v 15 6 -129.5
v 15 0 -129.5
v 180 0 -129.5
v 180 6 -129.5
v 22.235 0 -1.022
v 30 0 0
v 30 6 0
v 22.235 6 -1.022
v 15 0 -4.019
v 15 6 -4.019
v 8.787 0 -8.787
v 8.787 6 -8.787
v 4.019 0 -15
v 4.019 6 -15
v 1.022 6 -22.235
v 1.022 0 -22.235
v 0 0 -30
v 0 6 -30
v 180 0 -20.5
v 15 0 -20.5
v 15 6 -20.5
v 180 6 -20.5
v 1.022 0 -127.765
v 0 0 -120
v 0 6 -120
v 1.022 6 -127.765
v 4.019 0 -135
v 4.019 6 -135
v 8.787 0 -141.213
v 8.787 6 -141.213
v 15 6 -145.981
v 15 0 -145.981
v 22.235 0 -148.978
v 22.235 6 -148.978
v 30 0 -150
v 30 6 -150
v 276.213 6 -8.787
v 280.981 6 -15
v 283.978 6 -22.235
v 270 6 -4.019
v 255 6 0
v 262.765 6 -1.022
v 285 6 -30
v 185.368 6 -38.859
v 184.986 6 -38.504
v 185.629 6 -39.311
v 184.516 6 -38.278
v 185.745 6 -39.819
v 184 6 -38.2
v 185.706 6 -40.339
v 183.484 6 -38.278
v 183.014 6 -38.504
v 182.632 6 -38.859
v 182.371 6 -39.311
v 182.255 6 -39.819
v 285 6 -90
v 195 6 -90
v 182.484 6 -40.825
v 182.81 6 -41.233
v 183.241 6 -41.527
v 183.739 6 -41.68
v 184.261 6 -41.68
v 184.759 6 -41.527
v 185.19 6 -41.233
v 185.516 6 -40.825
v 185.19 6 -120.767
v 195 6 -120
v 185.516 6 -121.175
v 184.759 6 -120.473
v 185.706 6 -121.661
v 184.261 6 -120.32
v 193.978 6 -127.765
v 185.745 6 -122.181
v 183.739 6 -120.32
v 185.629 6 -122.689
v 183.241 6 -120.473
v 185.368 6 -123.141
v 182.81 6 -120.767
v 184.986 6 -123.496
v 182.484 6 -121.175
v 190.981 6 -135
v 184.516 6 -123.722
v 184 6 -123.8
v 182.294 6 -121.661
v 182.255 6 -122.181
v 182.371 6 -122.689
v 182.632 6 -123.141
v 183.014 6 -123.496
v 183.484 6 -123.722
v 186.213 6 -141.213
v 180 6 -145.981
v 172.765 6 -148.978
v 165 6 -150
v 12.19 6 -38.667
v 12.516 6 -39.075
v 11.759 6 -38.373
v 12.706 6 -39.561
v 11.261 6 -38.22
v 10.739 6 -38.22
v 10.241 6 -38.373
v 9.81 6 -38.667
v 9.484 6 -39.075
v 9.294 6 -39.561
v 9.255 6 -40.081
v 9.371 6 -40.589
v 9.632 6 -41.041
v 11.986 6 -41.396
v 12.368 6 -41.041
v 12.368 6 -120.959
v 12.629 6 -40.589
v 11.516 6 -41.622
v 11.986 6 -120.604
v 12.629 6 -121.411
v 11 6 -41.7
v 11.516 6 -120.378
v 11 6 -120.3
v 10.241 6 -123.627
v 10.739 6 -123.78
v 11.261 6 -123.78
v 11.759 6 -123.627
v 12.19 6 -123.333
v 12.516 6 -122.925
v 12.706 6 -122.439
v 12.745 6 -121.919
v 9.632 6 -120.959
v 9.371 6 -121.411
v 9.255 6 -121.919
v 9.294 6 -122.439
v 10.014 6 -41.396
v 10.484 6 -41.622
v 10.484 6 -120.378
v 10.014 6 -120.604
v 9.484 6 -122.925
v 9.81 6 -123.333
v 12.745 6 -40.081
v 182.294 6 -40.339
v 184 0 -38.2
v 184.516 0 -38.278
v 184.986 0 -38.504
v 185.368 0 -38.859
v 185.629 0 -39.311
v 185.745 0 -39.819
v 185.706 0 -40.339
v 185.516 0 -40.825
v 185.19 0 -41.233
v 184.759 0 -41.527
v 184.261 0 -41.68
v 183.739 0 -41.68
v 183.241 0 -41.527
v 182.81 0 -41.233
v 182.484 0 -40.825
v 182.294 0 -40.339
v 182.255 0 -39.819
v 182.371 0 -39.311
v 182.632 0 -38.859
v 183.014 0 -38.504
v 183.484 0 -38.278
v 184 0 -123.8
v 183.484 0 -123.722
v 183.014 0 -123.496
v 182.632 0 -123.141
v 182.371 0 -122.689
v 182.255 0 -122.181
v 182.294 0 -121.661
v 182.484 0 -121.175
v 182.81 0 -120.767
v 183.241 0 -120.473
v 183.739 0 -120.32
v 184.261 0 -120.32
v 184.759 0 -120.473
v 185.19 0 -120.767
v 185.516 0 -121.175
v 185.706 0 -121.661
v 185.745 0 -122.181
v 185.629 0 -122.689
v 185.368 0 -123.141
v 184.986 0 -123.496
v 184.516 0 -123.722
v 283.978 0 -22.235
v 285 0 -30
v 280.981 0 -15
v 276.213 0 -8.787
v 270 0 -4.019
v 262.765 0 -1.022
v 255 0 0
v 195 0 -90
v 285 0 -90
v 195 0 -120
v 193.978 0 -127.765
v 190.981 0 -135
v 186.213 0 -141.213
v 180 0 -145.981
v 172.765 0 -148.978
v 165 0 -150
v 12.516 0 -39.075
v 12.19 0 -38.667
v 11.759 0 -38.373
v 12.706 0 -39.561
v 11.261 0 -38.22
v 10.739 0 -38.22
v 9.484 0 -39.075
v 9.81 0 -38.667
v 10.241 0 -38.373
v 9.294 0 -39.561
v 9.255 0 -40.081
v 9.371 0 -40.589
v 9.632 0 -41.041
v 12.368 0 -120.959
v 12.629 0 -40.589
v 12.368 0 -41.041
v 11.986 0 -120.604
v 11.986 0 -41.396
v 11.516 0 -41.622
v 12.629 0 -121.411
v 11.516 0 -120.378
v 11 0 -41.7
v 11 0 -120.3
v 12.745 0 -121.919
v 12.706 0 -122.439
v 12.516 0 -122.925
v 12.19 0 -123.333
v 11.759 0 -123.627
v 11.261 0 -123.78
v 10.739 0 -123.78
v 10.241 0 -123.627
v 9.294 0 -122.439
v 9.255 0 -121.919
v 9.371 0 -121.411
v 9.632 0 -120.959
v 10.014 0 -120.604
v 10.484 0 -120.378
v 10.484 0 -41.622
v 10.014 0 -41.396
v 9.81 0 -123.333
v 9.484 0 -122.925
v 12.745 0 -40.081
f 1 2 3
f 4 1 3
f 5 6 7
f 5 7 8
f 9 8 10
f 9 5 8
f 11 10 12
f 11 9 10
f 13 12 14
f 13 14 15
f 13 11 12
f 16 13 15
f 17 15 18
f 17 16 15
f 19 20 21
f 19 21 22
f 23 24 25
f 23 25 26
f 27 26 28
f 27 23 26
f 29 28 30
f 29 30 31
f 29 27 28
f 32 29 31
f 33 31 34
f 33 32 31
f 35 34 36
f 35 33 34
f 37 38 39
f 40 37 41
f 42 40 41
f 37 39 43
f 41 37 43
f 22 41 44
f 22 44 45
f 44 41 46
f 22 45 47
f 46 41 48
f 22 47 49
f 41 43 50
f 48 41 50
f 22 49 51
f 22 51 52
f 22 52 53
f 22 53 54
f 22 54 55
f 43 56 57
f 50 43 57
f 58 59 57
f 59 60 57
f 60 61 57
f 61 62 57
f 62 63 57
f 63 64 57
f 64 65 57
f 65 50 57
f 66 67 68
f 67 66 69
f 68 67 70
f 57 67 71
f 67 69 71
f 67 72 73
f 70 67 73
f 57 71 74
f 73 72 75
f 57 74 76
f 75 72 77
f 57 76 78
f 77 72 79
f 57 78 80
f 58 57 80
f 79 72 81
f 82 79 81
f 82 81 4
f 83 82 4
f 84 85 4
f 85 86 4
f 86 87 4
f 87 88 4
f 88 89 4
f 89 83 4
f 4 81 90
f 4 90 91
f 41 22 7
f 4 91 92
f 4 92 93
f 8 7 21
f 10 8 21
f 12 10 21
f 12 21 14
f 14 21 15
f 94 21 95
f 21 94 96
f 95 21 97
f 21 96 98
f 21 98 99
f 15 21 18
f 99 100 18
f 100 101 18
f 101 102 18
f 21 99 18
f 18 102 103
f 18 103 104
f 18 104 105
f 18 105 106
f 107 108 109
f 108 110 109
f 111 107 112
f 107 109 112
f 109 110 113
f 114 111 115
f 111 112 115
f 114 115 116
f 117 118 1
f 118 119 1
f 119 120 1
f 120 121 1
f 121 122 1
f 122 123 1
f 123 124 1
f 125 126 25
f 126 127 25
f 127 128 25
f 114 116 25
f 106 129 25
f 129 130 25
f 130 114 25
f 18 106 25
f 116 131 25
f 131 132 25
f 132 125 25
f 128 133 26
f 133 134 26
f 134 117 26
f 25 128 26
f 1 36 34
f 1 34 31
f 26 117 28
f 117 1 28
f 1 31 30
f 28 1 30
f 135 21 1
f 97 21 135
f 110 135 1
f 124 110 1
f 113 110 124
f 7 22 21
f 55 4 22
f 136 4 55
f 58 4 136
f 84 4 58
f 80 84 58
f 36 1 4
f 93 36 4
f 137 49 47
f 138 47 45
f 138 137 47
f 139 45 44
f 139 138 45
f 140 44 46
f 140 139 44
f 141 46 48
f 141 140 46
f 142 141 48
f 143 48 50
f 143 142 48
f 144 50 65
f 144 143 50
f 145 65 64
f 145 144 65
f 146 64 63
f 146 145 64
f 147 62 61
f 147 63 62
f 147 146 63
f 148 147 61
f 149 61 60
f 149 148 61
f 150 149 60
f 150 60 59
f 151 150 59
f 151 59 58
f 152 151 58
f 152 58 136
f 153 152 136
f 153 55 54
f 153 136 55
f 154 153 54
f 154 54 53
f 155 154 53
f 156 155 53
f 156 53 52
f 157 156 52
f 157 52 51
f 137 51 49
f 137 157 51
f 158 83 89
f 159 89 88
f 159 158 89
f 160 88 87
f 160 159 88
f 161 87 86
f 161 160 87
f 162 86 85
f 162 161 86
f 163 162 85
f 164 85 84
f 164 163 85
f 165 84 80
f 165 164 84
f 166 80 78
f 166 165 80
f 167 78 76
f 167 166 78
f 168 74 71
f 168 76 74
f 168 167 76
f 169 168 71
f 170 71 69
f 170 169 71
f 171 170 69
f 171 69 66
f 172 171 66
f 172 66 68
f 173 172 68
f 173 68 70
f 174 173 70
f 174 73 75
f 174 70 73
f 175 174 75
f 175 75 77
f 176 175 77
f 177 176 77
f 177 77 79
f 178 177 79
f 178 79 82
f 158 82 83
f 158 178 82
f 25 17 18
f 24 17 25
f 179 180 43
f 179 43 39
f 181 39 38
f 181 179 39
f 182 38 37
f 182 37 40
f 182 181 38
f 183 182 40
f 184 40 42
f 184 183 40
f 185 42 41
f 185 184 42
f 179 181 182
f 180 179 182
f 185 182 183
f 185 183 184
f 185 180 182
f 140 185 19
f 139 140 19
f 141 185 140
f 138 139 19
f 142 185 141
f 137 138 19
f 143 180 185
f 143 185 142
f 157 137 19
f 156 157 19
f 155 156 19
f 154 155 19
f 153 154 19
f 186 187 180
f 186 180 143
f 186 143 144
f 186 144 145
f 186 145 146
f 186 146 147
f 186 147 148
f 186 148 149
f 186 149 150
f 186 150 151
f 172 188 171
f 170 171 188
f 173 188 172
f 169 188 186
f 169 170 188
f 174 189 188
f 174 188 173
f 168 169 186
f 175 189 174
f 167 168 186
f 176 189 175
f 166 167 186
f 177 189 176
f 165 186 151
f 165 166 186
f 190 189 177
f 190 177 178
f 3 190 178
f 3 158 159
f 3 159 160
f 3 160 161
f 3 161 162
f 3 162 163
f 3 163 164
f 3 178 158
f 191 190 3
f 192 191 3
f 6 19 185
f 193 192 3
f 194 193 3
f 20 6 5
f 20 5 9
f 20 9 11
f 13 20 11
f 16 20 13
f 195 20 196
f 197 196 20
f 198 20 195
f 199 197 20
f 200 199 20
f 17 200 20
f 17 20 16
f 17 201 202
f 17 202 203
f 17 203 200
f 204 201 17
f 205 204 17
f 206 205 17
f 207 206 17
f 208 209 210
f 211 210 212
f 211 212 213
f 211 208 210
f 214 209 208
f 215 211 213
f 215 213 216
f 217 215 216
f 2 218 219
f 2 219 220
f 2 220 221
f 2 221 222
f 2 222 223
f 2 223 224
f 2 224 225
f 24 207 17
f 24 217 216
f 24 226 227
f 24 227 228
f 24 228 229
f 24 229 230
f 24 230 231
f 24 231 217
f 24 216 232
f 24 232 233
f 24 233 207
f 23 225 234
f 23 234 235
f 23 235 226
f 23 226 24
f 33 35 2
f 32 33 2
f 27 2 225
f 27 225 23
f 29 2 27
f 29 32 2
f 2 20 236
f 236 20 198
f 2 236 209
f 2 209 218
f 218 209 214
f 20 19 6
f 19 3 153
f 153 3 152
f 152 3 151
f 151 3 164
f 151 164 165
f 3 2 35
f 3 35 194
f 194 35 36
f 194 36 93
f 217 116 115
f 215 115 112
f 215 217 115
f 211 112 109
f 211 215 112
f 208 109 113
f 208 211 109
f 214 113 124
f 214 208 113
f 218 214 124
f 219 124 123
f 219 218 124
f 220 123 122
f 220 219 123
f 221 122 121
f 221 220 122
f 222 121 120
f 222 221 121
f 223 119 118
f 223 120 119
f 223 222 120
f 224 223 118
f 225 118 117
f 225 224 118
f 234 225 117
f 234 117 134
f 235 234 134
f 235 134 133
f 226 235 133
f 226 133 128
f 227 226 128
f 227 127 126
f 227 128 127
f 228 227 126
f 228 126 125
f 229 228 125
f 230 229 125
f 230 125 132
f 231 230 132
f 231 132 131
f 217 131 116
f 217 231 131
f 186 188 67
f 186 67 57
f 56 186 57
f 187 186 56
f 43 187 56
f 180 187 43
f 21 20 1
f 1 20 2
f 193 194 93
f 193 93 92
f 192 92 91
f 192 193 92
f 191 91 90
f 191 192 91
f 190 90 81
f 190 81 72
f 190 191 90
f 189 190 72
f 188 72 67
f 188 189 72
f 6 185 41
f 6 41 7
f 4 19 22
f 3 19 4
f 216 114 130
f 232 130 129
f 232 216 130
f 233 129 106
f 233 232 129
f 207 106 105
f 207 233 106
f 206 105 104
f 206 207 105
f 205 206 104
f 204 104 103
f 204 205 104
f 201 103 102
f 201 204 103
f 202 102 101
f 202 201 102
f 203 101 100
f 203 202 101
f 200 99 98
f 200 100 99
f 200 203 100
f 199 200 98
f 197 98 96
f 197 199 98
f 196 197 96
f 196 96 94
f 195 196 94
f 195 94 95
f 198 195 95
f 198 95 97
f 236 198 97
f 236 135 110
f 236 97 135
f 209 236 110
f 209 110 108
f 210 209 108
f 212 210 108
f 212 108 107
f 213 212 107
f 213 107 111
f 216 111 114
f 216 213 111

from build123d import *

# Parameters (mm, degrees)
SKETCH1_W           = 165
SKETCH1_H           = 109
BOSS_EXTRUDE1_DEPTH = 6
SKETCH2_R           = 1.75
CUT_EXTRUDE4_DEPTH  = 323.119543027


with BuildPart() as part:
    # Sketch1 → Boss-Extrude1 (new body)
    with BuildSketch(Plane(origin=(0, 0, 0), x_dir=(1, 0, 0), z_dir=(0, 1, 0))):
        with BuildLine():
            Line((30, 150), (165, 150))
            ThreePointArc((165, 150), (186.213203436, 141.213203436), (195, 120))
            Line((195, 120), (195, 90))
            Line((195, 90), (285, 90))
            Line((285, 90), (285, 30))
            ThreePointArc((285, 30), (276.213203436, 8.786796564), (255, 0))
            Line((255, 0), (30, 0))
            ThreePointArc((30, 0), (8.786796564, 8.786796564), (0, 30))
            Line((0, 30), (0, 120))
            ThreePointArc((0, 120), (8.786796564, 141.213203436), (30, 150))
        make_face()
        with Locations((97.5, 75)):
            Rectangle(SKETCH1_W, SKETCH1_H, mode=Mode.SUBTRACT)
    extrude(amount=BOSS_EXTRUDE1_DEPTH)

    # Sketch2 → Cut-Extrude4 (cut, through all)
    with BuildSketch(Plane(origin=(0, 0, 0), x_dir=(1, 0, 0), z_dir=(0, 1, 0))):
        with Locations(Location((184, 122.05, 0), (0, 0, 90))):
            Circle(SKETCH2_R)
        with Locations(Location((11, 122.05, 0), (0, 0, 270))):
            Circle(SKETCH2_R)
        with Locations(Location((184, 39.95, 0), (0, 0, 270))):
            Circle(SKETCH2_R)
        with Locations(Location((11, 39.95, 0), (0, 0, 90))):
            Circle(SKETCH2_R)
    extrude(amount=CUT_EXTRUDE4_DEPTH, mode=Mode.SUBTRACT)


solid = part.part
